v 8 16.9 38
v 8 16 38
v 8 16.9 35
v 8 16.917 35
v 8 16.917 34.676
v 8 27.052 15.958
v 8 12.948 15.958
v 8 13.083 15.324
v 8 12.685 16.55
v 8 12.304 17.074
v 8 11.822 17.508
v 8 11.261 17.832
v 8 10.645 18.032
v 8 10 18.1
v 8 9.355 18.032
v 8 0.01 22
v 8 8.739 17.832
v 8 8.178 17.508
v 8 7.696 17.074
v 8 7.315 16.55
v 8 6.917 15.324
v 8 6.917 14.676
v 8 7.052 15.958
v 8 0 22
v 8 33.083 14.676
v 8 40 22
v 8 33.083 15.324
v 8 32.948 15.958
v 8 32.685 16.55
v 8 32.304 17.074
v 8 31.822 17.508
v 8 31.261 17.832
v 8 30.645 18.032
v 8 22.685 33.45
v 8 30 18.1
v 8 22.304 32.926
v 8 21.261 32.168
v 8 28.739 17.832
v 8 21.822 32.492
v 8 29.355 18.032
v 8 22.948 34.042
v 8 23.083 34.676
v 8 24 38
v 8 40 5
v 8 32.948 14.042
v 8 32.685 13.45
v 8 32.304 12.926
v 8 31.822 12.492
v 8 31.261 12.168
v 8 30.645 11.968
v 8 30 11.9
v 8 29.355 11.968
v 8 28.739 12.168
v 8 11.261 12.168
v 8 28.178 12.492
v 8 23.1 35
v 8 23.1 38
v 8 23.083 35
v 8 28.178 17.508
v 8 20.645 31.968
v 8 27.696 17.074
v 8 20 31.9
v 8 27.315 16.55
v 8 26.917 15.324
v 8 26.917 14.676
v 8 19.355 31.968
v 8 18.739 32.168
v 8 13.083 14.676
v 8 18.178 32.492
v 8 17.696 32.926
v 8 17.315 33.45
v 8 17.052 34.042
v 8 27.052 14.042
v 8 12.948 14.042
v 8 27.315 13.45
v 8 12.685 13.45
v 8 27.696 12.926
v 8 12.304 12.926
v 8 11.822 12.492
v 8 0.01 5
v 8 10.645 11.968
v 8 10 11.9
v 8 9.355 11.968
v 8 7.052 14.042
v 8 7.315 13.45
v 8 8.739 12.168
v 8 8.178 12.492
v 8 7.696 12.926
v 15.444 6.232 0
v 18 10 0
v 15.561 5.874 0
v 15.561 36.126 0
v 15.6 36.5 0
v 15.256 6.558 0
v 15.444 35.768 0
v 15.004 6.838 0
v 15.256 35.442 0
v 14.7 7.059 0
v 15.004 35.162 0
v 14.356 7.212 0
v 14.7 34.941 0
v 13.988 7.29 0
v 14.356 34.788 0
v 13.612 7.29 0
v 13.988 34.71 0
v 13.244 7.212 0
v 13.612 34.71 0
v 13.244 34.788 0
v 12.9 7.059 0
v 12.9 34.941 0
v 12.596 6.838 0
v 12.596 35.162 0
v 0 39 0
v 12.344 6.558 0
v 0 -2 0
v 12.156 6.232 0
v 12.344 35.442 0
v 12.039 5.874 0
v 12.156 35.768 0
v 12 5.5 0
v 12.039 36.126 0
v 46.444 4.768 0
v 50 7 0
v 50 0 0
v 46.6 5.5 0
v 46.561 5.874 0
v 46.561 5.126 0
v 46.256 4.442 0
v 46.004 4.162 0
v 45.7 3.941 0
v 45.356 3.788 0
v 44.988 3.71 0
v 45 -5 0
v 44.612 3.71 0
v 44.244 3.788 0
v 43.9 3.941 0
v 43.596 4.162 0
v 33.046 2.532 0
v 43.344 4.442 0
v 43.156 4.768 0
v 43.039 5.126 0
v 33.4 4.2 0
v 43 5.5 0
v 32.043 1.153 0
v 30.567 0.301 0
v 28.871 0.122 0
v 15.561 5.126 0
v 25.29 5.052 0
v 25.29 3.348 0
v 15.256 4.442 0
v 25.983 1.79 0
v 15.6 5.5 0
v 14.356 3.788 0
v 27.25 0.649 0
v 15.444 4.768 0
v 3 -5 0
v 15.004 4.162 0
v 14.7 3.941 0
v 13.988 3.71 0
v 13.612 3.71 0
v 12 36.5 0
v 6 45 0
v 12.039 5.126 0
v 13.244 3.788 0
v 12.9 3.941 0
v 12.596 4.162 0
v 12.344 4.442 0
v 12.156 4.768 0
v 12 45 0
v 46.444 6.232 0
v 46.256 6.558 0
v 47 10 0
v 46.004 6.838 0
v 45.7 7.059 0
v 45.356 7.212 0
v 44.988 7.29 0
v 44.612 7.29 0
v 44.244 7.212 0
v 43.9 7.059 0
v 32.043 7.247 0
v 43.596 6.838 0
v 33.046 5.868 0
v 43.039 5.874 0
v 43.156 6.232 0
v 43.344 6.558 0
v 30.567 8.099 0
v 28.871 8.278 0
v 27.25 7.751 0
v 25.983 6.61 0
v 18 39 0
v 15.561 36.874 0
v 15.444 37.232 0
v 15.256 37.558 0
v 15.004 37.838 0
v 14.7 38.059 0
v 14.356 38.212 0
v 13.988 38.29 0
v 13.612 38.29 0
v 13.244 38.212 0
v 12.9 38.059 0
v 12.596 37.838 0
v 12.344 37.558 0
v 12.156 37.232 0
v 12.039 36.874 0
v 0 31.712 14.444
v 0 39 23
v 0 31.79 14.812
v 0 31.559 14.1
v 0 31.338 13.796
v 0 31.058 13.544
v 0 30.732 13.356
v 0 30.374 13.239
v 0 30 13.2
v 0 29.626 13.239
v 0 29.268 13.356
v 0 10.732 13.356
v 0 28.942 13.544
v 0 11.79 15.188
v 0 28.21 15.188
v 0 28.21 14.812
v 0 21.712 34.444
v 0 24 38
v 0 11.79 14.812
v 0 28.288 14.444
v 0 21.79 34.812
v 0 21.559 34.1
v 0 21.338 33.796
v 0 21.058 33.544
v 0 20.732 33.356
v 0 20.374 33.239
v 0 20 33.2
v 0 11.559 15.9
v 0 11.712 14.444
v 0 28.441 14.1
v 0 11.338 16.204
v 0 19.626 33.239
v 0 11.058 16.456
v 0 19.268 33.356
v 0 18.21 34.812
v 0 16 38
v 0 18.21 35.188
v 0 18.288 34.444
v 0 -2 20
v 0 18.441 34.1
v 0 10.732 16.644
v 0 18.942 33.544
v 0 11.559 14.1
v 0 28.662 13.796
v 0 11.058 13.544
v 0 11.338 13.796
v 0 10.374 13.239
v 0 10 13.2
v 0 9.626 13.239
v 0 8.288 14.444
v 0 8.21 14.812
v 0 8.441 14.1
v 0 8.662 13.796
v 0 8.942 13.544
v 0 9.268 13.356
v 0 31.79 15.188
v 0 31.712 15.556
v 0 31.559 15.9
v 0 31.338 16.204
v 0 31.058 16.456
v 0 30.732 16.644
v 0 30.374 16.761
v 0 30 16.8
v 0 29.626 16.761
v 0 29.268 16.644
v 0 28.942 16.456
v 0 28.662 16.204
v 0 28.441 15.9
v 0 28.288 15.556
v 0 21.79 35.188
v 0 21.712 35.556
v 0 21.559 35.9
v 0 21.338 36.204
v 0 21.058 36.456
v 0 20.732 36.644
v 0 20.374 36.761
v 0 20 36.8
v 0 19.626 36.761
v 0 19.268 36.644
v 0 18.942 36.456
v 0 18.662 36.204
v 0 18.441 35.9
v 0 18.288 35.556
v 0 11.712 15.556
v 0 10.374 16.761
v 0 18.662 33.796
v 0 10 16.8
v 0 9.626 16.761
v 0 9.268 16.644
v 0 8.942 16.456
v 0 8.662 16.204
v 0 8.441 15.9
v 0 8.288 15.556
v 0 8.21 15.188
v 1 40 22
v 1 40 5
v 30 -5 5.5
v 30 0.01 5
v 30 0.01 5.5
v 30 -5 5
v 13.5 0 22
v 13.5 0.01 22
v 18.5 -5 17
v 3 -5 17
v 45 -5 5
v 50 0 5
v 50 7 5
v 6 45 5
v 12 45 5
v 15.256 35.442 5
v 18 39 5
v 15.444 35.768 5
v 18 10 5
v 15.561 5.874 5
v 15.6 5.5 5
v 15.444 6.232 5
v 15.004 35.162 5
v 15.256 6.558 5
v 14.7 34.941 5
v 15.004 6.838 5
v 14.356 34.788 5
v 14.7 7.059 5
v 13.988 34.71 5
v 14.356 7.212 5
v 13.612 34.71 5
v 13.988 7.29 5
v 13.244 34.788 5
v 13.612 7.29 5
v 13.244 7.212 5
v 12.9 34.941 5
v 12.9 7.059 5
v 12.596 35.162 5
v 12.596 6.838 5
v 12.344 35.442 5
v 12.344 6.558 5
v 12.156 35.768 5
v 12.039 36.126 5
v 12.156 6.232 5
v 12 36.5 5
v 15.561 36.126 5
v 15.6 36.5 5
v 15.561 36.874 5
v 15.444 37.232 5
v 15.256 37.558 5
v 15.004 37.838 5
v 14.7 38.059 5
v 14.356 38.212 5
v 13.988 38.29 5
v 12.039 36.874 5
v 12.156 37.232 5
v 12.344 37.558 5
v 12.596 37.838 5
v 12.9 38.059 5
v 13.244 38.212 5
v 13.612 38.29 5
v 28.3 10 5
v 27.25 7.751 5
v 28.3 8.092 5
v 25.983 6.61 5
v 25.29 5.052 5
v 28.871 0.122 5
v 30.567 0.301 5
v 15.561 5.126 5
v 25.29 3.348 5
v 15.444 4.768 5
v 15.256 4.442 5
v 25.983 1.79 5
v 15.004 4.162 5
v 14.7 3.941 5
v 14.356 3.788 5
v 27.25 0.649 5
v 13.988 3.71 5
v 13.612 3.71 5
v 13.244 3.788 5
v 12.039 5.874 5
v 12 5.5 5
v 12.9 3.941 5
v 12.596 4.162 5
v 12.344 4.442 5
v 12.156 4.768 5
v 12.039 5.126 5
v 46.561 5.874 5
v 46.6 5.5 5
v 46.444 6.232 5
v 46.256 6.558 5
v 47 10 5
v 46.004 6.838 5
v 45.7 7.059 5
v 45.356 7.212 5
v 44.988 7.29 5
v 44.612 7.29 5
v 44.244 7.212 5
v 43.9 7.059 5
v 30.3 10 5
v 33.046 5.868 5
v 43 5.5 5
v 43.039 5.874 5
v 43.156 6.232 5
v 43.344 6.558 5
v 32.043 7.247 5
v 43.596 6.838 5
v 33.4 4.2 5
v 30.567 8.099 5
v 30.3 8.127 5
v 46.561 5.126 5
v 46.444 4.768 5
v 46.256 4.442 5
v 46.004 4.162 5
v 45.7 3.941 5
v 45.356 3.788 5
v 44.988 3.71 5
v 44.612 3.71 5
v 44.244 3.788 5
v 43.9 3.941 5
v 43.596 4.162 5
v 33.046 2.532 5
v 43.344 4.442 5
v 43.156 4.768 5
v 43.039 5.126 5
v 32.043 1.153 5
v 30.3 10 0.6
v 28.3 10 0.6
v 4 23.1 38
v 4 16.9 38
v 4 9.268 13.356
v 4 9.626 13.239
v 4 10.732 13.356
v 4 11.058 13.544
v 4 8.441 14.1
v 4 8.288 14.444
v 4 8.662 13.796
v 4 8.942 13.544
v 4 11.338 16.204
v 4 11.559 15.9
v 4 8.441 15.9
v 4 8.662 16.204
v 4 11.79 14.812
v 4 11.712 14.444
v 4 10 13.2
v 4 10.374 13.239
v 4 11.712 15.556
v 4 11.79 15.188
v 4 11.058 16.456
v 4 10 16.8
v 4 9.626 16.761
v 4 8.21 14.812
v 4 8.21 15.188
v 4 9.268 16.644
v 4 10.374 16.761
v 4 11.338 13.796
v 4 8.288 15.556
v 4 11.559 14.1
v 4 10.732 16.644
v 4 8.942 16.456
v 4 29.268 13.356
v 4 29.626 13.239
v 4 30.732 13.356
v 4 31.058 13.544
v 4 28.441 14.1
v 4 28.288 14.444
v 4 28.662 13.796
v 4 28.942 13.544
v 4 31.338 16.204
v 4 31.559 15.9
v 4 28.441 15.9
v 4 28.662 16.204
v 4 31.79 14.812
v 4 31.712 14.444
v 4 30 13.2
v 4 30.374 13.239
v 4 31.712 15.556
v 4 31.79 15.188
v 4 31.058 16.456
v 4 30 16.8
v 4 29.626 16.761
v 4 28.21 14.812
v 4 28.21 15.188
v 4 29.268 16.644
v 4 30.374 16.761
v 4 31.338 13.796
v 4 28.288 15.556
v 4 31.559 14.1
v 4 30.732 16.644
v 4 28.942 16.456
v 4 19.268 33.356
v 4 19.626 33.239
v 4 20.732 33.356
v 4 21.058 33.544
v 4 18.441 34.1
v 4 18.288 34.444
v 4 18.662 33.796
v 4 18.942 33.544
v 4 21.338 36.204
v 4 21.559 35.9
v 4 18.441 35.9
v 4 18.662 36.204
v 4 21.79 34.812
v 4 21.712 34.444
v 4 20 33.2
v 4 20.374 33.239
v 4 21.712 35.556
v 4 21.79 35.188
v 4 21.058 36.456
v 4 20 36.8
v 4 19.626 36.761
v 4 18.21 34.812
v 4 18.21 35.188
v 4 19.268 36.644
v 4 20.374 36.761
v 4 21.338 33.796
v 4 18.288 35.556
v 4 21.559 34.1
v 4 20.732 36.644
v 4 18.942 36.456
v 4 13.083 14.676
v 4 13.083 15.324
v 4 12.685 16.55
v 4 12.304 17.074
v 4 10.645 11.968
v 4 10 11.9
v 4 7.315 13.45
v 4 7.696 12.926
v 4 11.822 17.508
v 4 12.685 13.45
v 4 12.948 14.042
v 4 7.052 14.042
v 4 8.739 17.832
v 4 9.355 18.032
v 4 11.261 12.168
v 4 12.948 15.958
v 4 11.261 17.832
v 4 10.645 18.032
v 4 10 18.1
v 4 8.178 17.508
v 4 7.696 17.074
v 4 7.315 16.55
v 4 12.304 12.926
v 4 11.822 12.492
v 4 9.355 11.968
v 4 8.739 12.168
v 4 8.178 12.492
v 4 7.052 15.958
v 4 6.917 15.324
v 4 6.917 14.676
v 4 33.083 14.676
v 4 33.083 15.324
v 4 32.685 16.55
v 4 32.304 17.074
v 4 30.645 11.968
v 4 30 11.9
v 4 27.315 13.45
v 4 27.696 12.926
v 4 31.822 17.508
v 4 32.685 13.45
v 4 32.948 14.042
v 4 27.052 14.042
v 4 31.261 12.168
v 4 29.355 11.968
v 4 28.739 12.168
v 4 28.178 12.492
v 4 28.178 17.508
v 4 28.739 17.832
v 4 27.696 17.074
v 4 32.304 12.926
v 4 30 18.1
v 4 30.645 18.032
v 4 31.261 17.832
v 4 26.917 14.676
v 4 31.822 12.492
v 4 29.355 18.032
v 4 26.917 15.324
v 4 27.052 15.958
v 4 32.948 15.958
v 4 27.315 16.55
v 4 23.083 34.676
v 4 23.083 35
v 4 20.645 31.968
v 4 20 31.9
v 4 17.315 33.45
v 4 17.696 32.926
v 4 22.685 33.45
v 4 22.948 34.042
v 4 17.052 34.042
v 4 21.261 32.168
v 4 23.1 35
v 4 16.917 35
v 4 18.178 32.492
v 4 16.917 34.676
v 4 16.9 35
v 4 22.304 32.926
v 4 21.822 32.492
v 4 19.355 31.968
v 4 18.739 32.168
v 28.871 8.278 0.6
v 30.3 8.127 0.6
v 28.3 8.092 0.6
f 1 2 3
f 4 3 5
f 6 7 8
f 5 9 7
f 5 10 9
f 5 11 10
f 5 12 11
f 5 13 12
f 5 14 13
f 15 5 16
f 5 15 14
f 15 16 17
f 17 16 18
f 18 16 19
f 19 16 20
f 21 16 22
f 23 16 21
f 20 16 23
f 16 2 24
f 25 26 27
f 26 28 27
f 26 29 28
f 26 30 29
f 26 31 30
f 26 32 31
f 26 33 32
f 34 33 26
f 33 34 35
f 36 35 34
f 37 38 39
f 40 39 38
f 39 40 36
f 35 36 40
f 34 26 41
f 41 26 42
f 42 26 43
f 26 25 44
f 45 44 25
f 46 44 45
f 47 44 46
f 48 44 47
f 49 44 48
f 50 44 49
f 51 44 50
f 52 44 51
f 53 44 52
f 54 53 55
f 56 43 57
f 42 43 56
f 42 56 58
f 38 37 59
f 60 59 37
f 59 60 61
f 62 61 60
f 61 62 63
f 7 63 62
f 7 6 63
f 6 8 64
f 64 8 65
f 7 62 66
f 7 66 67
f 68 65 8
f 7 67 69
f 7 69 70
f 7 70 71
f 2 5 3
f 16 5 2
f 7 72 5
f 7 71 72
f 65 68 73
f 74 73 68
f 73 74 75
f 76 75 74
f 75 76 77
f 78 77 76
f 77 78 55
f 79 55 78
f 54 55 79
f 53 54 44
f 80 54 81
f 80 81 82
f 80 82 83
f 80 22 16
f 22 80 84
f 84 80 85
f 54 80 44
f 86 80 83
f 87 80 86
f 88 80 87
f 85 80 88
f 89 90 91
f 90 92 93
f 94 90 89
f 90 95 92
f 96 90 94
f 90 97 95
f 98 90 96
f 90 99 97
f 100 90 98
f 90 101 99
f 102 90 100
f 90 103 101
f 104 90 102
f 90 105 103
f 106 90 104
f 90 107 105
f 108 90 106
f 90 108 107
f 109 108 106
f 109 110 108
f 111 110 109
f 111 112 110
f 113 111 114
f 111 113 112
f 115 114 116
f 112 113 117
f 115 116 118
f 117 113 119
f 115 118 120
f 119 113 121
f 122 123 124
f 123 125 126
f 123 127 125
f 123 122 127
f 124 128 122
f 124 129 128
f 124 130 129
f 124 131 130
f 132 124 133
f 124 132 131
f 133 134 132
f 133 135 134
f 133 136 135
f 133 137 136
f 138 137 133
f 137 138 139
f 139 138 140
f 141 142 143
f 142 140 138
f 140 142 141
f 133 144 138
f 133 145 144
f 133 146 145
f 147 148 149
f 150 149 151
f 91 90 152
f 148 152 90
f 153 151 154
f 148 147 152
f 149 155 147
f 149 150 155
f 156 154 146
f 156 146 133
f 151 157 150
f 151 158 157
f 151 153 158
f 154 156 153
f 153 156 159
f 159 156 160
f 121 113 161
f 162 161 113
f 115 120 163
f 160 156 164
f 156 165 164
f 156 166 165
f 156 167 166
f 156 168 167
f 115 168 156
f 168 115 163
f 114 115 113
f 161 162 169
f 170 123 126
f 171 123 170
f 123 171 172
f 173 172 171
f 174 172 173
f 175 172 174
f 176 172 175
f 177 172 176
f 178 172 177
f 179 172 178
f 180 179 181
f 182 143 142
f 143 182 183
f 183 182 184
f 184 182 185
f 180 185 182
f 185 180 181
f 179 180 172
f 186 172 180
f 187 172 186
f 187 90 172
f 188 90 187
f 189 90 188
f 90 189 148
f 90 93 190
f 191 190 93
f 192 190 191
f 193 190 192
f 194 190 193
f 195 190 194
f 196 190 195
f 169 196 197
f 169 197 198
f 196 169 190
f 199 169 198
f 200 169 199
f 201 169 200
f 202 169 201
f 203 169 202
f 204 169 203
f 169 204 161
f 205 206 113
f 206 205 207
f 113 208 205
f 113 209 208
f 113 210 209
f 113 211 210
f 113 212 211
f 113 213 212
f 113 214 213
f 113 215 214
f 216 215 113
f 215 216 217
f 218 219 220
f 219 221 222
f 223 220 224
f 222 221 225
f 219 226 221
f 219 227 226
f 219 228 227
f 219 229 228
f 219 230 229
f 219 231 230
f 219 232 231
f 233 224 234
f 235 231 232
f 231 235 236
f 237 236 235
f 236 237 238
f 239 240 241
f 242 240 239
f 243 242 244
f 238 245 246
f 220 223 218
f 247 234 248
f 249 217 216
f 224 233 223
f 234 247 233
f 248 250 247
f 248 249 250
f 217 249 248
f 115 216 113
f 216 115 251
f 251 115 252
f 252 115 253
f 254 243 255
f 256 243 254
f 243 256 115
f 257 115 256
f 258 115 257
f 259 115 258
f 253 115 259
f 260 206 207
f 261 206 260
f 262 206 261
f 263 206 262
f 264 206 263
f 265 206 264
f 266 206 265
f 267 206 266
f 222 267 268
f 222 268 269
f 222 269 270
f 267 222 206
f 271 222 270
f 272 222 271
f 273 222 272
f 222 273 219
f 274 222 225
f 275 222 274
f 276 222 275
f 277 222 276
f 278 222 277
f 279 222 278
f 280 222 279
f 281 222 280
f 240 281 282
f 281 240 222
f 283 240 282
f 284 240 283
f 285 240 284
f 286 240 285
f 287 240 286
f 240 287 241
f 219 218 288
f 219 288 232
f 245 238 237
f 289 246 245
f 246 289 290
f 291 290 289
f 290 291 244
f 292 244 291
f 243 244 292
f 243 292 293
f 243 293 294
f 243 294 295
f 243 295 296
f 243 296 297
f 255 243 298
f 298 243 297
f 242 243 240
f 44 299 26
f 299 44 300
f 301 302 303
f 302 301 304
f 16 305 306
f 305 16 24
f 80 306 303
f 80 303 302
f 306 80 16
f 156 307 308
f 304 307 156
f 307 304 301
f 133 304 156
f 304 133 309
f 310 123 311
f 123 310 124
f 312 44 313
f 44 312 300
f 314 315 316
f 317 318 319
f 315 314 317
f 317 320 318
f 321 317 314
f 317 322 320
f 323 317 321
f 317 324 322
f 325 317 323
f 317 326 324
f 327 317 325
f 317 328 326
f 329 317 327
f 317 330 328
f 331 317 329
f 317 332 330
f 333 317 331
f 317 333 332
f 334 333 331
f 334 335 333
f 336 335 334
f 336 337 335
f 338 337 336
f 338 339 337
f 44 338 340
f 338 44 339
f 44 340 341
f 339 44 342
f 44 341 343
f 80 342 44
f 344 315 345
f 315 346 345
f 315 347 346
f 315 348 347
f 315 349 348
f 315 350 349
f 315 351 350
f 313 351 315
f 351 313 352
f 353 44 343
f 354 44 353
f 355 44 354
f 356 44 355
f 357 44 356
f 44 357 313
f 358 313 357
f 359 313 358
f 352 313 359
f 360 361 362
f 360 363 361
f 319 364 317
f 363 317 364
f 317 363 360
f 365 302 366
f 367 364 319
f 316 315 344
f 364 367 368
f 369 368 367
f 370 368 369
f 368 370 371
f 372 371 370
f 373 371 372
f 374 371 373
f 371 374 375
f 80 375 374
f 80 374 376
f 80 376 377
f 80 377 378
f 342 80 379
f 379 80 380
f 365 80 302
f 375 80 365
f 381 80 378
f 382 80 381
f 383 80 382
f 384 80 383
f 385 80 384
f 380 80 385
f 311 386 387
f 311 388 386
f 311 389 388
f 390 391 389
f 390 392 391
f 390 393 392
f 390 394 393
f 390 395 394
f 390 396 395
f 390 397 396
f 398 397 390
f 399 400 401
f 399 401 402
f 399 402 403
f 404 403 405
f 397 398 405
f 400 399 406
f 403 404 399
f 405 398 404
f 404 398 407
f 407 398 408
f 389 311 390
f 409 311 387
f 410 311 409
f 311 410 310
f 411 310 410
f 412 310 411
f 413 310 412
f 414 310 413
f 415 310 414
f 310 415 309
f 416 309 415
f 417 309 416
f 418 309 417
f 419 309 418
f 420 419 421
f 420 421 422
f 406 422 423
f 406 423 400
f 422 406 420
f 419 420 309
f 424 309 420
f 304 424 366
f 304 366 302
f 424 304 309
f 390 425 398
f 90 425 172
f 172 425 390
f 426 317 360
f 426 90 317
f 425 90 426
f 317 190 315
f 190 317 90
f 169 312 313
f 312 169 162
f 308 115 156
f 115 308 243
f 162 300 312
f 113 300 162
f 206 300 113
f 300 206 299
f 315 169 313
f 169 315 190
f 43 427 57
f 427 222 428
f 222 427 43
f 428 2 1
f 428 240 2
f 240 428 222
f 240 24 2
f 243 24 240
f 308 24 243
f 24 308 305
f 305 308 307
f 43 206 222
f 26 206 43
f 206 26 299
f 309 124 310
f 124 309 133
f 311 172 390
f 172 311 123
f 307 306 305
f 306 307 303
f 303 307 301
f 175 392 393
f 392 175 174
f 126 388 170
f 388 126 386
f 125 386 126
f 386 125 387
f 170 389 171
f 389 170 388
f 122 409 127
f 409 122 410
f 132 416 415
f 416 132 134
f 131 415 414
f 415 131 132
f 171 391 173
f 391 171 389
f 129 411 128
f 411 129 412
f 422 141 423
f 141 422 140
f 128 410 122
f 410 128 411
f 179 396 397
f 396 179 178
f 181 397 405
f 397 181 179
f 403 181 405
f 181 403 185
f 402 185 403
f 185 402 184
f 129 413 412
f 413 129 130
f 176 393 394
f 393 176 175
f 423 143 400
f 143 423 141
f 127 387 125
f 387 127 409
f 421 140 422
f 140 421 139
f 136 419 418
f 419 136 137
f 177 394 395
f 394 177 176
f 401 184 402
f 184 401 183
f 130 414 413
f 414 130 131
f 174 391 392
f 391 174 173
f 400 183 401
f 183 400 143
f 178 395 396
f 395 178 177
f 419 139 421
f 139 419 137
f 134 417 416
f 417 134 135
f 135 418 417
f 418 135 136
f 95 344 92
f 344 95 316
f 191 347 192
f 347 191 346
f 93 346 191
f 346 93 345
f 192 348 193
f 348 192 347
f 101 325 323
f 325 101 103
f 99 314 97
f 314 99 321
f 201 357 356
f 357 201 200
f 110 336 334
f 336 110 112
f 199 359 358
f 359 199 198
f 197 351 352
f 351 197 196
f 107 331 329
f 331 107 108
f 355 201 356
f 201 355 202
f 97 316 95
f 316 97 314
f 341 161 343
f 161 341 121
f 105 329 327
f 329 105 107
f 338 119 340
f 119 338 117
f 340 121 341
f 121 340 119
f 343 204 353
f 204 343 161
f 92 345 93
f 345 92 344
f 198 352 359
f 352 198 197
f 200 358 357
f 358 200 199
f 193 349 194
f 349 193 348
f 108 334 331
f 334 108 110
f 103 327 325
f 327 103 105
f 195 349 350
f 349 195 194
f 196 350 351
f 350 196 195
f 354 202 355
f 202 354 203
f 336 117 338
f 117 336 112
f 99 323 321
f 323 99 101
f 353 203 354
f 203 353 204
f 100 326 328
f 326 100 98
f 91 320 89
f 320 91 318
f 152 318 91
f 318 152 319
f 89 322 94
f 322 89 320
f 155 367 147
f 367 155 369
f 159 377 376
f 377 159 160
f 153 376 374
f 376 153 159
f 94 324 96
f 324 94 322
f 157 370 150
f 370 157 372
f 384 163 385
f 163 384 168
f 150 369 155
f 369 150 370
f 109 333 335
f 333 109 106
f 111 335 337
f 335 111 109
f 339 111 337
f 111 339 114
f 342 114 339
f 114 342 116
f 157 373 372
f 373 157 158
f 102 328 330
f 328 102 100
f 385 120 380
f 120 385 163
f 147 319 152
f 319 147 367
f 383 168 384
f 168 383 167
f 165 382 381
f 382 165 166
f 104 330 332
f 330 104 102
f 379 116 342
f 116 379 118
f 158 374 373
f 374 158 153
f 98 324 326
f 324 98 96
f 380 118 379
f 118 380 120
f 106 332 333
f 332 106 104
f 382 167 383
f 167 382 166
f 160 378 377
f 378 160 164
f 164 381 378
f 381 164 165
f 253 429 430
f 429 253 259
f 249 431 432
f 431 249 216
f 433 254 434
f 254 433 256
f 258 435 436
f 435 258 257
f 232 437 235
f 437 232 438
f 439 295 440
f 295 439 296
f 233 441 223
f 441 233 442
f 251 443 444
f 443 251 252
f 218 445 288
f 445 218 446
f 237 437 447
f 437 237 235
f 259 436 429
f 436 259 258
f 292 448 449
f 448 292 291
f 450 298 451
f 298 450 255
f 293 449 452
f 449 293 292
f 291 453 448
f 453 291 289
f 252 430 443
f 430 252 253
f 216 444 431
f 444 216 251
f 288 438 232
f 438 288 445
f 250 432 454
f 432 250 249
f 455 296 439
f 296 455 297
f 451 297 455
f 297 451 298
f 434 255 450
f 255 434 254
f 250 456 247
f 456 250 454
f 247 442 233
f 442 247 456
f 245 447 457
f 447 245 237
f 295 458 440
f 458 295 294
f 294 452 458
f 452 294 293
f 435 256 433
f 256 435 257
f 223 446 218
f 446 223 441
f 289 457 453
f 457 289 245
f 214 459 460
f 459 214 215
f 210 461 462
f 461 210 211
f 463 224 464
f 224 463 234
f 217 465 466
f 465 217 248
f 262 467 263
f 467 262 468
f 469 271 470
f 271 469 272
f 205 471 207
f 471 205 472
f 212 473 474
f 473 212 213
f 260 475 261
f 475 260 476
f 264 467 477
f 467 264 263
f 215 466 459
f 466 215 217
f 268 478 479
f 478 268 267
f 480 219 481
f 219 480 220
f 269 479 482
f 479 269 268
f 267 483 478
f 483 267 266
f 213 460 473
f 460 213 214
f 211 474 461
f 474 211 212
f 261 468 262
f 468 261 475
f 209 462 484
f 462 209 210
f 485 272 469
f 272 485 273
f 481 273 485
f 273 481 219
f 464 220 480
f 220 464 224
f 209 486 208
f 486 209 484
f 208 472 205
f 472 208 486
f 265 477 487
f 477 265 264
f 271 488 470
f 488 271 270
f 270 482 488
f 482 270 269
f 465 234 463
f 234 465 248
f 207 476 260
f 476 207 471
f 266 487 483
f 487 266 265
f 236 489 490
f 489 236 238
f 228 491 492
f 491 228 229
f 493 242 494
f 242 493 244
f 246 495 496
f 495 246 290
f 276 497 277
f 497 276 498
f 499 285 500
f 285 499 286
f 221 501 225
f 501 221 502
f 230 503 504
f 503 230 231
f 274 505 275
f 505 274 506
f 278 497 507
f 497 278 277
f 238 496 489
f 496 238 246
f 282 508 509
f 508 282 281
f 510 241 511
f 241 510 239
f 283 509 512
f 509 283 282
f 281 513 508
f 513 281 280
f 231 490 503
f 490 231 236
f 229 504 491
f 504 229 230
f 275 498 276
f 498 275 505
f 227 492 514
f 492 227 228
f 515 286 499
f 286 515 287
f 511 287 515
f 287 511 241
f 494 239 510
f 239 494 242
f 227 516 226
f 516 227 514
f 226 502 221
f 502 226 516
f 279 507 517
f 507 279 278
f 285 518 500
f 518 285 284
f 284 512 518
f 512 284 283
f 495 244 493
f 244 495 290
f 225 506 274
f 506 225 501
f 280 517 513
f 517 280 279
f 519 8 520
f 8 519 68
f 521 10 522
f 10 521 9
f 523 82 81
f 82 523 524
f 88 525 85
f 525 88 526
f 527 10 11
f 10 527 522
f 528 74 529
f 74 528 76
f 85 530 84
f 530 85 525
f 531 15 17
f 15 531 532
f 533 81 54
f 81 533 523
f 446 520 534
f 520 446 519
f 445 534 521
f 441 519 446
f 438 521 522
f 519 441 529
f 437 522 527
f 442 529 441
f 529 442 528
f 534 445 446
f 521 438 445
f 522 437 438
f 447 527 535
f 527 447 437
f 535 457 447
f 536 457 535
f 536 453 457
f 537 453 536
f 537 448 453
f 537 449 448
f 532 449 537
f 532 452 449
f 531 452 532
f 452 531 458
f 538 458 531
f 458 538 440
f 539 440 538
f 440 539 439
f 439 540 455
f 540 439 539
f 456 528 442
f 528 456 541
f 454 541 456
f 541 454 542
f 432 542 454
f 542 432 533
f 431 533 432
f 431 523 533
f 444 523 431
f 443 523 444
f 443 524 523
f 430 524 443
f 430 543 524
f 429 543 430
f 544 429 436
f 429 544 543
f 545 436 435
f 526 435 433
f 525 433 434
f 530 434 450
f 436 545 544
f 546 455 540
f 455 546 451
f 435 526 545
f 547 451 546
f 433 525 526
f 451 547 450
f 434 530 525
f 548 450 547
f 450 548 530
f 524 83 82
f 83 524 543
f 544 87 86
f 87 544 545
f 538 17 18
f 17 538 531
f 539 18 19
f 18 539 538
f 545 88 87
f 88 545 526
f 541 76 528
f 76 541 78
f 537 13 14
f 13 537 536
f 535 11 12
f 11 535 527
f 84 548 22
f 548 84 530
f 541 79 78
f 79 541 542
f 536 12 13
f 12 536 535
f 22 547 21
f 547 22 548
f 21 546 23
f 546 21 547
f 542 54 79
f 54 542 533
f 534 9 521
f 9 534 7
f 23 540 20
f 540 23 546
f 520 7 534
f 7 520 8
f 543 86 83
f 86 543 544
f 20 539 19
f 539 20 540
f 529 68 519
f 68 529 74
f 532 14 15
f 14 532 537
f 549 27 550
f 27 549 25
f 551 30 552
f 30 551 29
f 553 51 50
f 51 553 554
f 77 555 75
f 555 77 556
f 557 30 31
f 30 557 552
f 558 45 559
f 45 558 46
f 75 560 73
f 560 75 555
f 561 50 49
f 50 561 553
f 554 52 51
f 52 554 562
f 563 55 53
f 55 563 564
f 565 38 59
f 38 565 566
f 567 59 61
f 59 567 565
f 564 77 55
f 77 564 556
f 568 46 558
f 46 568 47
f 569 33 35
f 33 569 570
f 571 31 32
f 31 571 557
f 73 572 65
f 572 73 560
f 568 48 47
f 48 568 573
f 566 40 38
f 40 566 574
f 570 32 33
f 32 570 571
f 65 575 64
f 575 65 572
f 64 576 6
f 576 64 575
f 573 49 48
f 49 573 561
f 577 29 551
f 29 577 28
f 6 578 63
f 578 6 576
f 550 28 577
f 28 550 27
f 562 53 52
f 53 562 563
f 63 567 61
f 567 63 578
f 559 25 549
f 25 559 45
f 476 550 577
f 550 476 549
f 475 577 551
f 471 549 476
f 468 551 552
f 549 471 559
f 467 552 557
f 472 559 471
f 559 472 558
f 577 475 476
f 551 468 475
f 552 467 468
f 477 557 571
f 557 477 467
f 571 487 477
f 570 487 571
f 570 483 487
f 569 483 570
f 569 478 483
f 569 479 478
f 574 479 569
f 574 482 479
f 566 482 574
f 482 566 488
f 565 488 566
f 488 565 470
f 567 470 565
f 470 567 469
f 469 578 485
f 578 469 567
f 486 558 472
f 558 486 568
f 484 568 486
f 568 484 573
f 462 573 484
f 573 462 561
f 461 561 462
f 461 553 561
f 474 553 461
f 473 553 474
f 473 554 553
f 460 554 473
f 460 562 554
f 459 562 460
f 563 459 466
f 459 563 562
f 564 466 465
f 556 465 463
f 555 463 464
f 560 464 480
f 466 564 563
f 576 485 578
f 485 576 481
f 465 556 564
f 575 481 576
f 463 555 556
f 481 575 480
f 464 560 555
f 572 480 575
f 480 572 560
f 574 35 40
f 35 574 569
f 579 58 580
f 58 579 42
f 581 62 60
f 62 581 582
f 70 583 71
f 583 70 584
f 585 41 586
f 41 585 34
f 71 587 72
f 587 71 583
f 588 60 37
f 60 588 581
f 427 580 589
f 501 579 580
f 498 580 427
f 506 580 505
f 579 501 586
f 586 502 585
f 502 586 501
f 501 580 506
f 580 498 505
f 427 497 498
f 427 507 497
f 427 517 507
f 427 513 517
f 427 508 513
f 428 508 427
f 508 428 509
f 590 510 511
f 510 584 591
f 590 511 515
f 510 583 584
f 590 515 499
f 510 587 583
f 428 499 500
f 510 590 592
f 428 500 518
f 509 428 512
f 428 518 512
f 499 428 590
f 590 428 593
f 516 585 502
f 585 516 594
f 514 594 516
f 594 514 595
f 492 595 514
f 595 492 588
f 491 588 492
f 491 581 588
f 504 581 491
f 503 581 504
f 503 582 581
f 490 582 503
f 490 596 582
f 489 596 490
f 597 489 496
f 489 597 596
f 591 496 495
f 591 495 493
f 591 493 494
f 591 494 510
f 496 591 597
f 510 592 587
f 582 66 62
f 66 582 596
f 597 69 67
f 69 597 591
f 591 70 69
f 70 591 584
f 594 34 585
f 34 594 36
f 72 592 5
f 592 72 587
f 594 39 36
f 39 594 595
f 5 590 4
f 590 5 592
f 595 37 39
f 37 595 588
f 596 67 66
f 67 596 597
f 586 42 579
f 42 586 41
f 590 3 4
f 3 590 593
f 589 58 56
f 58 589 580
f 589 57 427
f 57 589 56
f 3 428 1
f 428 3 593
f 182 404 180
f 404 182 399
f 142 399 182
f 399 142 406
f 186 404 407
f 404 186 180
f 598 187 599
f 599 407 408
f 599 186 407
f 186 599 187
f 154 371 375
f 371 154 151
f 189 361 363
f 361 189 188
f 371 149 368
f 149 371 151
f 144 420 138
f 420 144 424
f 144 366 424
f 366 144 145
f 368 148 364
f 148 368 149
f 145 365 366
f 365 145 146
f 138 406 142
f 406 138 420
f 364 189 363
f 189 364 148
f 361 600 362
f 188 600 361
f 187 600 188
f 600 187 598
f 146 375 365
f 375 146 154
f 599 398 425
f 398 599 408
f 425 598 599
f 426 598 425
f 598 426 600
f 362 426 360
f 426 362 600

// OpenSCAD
// PRUSA iteration3
// Z axis bottom holder
// GNU GPL v3
// Josef Průša <iam@josefprusa.cz> and contributors
// http://www.reprap.org/wiki/Prusa_Mendel
// http://prusamendel.org

module z_bottom_base(){
 translate([0,0,0]) cube([8,40,16+25]); // plate touching the base
 translate([0,-5,0]) cube([30,5.01,22]); // plate touching the base
 translate([0,-5,0]) cube([50,15,5]); // plate touching the base
 translate([0,-5,0]) cube([18,50,5]);
}

module z_bottom_fancy(){
 // corner cutouts
 translate([0.5,-2.5,0]) rotate([0,0,-45-180]) translate([-15,0,-1]) cube([30,30,51]);
 translate([0.5,40-0.5,0]) rotate([0,0,-45+90]) translate([-15,0,-1]) cube([30,30,51]);
 //translate([-4,40+5,5]) rotate([0,0,-35-0]) translate([0,0,0.1]) cube([30,30,51]);
 translate([-4+11,40+5+5,0]) rotate([0,0,-45-0]) translate([0,0,-1]) cube([30,30,51]);
 translate([8.1,0,12+20+6]) rotate([0,-90,0]) translate([0,-5,0]) cube([30,50,30]);
 translate([20,-2,12+8]) rotate([45,0,0]) rotate([0,-90,0]) translate([0,-5,0]) cube([30,50,30]);
 translate([8.1,20,12+30]) rotate([-45,0,0]) rotate([0,-90,0]) translate([0,-5,0]) cube([30,50,30]);
 translate([50-2.5,-5+2.5,0]) rotate([0,0,-45-90]) translate([-15,0,-1]) cube([30,30,51]);
 translate([50-1.5,10-1.5,0]) rotate([0,0,-45]) translate([-15,0,-1]) cube([30,30,51]);
 //translate([0,0,5]) rotate([45+180,0,0]) rotate([0,0,-45+90]) translate([0,0,-15]) cube([30,30,30]);
 // Stiffner cut out
 translate([30,-0.1,5.5]) rotate([0,-45,0]) translate([0,-5,0]) cube([30,50,30]);
}

module z_bottom_holes(){
 // Frame mounting screw holes
 translate([-1,10,10+5]) rotate([0,90,0]) cylinder(h = 20, r=1.8, $fn=30);
 translate([-1,10+20,10+5]) rotate([0,90,0]) cylinder(h = 20, r=1.8, $fn=30);
 translate([-1,10+10,10+20+5]) rotate([0,90,0]) cylinder(h = 20, r=1.8, $fn=30);

 // Frame mounting screw head holes
 translate([4,10,10+5]) rotate([0,90,0]) cylinder(h = 20, r=3.1, $fn=30);
 translate([4,10+20,10+5]) rotate([0,90,0]) cylinder(h = 20, r=3.1, $fn=30);
 translate([4,10+10,10+20+5]) rotate([0,90,0]) cylinder(h = 20, r=3.1, $fn=30);
 translate([4,10+10-3.1,10+20+5]) cube([10,6.2,10]);

 // Z rod holder
 translate([25+4.3,4.2,-1]) rotate([0,0,0]) cylinder(h = 50, r=4.1, $fn=15);
 translate([25+4.3-1,3,0.6]) cube([2,10,7]); // it's bit up because it helps with printing

 // motor mounting
 translate([25+4.3,21,-1]){
 //translate([15.5,15.5,-1]) cylinder(h = 20, r=1.8, $fn=30);
 
 translate([15.5,-15.5,-1]) cylinder(h = 20, r=1.8, $fn=30);
 translate([-15.5,15.5,-1]) cylinder(h = 20, r=1.8, $fn=30);
 translate([-15.5,-15.5,-1]) cylinder(h = 20, r=1.8, $fn=30);
 }

}

// Final part
module z_bottom_holder(){
 difference(){
  z_bottom_base();
  z_bottom_fancy();
  z_bottom_holes();
 }
// translate([0,-13,0]) mirror([0,1,0]) difference(){
//  z_bottom_base();
//  z_bottom_fancy();
//  z_bottom_holes();
// }
}

z_bottom_holder();
